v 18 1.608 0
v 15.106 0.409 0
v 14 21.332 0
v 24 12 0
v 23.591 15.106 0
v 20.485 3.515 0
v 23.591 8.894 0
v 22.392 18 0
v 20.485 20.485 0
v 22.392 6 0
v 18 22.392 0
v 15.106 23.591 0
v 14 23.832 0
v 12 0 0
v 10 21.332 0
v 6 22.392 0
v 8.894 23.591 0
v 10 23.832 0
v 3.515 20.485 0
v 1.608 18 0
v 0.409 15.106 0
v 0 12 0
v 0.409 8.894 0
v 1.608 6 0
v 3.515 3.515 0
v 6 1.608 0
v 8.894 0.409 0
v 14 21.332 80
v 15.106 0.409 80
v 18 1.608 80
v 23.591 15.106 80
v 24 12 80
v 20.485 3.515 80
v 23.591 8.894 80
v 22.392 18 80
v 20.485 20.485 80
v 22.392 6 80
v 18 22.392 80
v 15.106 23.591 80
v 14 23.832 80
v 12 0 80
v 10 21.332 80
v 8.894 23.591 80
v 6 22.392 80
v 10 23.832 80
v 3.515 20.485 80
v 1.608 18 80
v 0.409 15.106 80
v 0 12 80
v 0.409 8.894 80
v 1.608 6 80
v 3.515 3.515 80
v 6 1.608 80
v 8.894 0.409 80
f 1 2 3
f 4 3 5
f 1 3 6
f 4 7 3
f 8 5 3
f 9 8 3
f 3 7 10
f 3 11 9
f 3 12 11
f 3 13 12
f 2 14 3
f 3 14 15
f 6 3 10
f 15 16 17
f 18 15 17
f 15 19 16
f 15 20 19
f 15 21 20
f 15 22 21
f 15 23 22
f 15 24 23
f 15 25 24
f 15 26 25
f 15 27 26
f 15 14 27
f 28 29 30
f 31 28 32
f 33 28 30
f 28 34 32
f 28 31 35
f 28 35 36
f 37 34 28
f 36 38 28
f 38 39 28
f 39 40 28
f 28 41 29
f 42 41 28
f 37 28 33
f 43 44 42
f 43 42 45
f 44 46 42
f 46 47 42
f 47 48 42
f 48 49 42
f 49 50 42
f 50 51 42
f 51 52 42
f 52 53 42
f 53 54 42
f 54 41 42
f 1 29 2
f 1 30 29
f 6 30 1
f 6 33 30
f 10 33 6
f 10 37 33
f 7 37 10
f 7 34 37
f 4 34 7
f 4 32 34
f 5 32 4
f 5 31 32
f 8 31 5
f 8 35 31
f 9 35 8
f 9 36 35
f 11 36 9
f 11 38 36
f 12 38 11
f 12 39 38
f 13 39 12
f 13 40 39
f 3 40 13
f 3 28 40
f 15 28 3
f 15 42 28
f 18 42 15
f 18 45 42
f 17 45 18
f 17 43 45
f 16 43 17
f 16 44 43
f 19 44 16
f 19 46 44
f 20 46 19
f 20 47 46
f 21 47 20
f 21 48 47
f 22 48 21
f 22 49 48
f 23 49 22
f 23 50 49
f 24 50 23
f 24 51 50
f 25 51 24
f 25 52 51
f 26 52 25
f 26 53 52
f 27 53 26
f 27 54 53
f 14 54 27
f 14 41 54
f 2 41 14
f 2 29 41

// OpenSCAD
$fn = 32;

// ----------------------------------------------------------------------
// Keyway shaft: d24 shaft, key 4 x 2.5 mm
// ----------------------------------------------------------------------

// --- parameters (mm) ---
shaft_r = 12;             // shaft radius
key_w = 4;                // keyway width
key_d = 2.5;              // keyway depth below the surface line
plate_t = 80;             // shaft length, Z (extrusion height)
fit_tol = 0.05;           // declared fit tolerance (prompt contract)
free_tol = 0.3;           // declared free tolerance (prompt contract)

shaft_d = 2 * shaft_r;  // shaft diameter
circle_step = 15;  // polygon sampling step, degrees

profile = [[8.894, 23.591], [6, 22.392], [3.515, 20.485], [1.608, 18], [0.409, 15.106], [0, 12], [0.409, 8.894], [1.608, 6], [3.515, 3.515], [6, 1.608], [8.894, 0.409], [12, 0], [15.106, 0.409], [18, 1.608], [20.485, 3.515], [22.392, 6], [23.591, 8.894], [24, 12], [23.591, 15.106], [22.392, 18], [20.485, 20.485], [18, 22.392], [15.106, 23.591], [14, 23.832], [14, 21.332], [10, 21.332], [10, 23.832]];  // primary outline, 27 points, counter clockwise

// --- the one profile operation ---
linear_extrude(height = plate_t) polygon(points = profile);
